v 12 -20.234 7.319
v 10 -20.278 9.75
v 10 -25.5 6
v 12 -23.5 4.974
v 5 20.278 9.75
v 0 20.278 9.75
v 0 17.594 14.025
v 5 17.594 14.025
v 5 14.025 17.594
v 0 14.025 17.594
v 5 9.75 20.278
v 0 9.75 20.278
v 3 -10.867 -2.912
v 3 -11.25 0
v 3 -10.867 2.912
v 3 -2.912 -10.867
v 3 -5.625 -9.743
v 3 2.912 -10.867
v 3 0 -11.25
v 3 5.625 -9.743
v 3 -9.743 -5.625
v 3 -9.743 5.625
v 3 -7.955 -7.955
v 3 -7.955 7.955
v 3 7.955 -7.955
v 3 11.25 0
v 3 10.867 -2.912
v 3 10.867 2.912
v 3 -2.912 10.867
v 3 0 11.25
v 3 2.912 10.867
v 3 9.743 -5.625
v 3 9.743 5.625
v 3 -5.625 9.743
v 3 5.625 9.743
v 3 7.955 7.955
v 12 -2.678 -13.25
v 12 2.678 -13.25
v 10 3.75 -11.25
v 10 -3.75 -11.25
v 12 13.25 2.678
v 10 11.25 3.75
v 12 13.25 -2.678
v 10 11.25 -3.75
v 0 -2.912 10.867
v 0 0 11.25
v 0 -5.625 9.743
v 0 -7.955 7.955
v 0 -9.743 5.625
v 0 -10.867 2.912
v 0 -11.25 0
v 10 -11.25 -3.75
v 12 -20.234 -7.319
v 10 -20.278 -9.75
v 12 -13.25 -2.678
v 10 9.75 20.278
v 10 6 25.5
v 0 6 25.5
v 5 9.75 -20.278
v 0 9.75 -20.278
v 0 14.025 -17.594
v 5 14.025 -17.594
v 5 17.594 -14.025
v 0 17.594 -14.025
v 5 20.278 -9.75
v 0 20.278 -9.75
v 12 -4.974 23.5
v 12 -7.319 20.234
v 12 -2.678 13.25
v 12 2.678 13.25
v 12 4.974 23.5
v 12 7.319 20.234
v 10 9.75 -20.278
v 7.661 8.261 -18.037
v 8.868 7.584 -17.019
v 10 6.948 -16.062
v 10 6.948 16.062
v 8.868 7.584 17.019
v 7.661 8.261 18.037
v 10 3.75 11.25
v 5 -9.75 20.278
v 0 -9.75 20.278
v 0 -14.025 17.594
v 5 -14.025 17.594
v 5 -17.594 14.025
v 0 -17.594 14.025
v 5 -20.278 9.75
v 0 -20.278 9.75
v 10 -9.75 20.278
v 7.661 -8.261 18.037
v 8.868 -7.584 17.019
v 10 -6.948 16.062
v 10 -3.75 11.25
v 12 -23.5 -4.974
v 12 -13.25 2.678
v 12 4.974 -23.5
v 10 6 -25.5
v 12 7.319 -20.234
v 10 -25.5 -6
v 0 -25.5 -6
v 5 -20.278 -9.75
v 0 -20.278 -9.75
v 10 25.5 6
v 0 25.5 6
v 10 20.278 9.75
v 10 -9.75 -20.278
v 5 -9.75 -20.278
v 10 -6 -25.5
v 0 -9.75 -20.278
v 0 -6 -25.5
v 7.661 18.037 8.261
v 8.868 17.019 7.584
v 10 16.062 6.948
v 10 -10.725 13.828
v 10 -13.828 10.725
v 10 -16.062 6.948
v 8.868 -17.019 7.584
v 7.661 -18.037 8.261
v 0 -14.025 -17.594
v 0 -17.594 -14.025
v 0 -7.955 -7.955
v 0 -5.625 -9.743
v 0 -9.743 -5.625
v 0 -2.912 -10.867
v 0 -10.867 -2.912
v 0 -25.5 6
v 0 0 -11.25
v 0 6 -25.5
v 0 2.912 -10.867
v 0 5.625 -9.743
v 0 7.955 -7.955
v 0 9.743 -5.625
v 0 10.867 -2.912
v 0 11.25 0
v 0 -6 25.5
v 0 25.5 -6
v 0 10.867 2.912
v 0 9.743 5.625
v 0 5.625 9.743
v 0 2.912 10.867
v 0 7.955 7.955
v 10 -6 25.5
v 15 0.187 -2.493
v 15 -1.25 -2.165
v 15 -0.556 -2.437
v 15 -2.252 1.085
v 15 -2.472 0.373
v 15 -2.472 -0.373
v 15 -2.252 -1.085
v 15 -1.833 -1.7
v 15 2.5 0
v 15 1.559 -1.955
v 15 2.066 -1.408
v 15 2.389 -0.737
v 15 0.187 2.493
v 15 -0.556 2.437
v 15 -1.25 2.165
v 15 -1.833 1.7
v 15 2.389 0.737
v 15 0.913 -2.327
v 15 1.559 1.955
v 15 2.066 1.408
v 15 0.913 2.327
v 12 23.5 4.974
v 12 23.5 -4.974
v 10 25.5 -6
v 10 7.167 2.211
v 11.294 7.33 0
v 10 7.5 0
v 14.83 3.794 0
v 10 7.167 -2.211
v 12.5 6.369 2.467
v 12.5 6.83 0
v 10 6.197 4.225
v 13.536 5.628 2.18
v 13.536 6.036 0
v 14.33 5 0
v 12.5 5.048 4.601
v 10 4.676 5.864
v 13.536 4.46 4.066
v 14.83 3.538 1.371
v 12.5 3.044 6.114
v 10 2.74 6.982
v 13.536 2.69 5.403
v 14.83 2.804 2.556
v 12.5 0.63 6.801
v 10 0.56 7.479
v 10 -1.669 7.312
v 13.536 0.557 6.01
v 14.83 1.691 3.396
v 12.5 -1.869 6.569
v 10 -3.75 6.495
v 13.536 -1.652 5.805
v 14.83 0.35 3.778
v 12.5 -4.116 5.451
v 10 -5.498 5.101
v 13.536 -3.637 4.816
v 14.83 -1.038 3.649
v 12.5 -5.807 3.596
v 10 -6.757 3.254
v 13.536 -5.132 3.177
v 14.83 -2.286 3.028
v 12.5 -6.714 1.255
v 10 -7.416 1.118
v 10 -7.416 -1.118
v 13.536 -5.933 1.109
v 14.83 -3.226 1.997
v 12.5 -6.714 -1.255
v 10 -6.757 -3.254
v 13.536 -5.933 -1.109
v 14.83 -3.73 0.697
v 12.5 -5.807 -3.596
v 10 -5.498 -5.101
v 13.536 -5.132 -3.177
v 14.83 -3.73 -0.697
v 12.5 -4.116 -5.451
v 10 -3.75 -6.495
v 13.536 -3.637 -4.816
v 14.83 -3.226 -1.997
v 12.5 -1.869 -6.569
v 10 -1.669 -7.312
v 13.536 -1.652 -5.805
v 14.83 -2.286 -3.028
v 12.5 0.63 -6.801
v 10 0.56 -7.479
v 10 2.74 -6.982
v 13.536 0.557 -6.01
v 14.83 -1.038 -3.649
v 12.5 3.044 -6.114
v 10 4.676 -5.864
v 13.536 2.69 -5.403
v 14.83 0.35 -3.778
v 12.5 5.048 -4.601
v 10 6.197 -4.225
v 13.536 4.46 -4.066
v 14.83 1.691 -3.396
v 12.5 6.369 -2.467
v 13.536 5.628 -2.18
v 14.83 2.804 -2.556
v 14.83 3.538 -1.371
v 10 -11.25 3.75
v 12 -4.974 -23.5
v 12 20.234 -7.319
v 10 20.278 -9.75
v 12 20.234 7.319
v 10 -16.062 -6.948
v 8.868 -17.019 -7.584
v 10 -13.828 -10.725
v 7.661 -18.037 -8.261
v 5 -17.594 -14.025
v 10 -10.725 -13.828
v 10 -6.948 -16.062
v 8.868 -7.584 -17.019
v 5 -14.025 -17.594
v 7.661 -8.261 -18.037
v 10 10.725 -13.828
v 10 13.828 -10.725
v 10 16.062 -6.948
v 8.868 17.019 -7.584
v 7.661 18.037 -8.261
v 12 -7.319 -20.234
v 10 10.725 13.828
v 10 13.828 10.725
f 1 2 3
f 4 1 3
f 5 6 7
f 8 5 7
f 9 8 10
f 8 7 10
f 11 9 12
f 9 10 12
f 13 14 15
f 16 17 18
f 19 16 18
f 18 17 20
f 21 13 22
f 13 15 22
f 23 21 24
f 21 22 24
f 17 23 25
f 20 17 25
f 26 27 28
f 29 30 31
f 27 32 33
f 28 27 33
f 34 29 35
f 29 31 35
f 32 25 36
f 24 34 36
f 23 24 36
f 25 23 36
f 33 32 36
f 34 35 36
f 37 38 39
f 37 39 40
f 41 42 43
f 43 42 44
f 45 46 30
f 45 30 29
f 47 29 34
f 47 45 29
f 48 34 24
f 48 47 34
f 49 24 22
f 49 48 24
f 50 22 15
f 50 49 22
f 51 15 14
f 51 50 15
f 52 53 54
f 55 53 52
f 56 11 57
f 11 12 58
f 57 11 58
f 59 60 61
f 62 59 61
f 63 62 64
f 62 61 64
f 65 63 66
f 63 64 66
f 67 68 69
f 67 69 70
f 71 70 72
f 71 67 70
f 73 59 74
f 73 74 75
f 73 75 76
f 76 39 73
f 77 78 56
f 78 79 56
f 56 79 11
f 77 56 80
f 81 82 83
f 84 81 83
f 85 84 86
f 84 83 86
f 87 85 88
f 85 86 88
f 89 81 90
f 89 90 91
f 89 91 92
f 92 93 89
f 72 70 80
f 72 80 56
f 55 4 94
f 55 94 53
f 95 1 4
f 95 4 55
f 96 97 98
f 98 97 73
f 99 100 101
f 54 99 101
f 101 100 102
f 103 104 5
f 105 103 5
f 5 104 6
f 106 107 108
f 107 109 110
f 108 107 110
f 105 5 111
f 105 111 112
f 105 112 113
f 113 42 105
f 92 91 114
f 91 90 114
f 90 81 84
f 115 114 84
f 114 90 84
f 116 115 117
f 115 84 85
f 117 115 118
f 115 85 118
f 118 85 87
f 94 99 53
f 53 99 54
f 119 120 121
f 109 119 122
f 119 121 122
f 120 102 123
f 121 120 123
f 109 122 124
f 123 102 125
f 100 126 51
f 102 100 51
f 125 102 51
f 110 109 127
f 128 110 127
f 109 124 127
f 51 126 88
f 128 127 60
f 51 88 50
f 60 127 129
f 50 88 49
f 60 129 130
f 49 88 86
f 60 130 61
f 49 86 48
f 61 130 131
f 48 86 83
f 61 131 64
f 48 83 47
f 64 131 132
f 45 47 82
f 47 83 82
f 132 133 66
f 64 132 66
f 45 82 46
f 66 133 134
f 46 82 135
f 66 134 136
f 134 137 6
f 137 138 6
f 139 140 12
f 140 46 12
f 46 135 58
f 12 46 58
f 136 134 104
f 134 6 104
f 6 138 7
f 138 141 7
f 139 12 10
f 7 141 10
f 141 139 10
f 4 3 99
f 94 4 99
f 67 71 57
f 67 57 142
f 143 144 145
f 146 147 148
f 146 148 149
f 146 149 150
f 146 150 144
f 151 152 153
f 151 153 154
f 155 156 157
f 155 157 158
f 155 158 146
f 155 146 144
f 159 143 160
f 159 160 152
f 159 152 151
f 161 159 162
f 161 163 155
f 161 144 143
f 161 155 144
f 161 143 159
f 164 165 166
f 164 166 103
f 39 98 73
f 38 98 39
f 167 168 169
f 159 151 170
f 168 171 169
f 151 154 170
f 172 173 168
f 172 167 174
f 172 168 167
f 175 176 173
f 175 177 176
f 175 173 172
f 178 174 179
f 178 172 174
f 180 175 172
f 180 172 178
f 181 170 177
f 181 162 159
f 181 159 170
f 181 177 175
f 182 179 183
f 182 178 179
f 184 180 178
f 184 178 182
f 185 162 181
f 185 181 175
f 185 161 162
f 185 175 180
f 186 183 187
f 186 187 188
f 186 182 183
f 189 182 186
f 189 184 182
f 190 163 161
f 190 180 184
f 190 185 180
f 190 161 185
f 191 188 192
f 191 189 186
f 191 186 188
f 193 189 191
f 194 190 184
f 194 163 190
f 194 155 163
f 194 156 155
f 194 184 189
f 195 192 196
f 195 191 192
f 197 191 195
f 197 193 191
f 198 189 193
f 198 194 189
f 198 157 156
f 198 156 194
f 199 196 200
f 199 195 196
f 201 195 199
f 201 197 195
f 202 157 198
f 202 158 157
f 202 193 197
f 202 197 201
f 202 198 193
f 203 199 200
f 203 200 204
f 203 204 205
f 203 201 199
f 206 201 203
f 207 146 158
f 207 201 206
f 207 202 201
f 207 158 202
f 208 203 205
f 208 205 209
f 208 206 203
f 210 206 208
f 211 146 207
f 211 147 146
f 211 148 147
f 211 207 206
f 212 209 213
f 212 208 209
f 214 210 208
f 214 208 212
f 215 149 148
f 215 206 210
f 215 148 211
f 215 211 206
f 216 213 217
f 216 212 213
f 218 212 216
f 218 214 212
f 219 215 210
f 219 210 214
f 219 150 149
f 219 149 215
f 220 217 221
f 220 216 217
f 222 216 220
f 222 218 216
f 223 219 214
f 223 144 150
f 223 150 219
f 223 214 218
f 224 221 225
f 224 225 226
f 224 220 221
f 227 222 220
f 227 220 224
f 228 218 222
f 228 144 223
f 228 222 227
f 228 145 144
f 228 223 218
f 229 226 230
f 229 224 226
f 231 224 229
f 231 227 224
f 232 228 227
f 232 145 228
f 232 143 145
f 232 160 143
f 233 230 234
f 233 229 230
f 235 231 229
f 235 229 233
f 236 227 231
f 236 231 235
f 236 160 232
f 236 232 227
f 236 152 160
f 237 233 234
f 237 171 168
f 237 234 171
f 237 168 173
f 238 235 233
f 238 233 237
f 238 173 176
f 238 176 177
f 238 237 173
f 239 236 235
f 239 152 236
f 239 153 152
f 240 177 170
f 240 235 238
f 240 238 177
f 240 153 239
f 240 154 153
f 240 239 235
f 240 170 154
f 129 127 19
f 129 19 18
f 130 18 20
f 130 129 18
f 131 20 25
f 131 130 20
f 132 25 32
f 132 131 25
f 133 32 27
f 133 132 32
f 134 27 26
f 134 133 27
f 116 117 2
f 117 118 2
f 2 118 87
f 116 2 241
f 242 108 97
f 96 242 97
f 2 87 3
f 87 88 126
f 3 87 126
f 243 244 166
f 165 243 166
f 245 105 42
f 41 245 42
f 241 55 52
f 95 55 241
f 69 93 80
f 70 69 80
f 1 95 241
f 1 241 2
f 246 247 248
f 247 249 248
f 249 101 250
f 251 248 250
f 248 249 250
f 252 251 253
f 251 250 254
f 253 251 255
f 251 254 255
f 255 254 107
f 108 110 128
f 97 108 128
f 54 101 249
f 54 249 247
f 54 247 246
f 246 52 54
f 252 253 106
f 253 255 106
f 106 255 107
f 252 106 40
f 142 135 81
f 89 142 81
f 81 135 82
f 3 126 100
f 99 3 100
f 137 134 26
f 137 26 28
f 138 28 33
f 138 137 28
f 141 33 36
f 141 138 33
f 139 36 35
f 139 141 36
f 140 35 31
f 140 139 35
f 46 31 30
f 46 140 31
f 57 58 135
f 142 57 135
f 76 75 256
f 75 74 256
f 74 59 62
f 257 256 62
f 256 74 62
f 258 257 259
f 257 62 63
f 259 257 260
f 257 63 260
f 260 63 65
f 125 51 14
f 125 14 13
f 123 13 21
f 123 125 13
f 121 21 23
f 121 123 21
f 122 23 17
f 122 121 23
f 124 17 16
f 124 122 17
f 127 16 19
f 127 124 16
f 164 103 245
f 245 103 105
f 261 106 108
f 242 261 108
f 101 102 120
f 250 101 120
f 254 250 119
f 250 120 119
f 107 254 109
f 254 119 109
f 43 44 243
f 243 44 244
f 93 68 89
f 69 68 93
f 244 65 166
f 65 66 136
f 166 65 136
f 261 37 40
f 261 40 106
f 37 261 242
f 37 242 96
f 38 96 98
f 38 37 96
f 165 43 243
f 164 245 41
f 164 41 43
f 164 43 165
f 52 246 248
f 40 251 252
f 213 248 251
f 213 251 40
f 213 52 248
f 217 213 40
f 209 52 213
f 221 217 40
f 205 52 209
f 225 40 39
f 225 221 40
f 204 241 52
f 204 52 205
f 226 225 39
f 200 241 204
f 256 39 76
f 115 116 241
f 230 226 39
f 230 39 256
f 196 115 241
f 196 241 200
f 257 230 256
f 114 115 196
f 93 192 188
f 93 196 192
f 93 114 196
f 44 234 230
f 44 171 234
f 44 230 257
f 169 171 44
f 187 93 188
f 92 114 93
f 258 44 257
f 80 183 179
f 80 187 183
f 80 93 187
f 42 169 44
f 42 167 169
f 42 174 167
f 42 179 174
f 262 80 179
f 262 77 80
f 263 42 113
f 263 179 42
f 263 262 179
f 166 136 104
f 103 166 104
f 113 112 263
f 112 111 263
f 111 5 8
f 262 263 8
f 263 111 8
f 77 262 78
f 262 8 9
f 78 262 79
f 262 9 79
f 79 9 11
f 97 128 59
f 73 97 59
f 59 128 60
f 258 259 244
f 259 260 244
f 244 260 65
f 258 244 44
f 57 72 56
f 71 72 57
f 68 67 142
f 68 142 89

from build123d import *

# Parameters (mm, degrees)
F1_DEPTH = 10
F2_DEPTH = 12
F3_SIZE  = 5
F4_SIZE  = 1.99999
F5_R     = 7.5
F6_DEPTH = 5
F7_R     = 4.99999
F9_DEPTH = 3


# Not quite as in the source:
# - a fillet or chamfer is up to 0.001 mm smaller than in the source, because OpenCascade refuses the exact size
# - a feature names something its author has since deleted; it is built from what else it names


with BuildPart() as f1:
    # F0 (on Right) → F1 (new body)
    with BuildSketch(Plane.YZ):
        with BuildLine():
            Line((11.25, 3.75), (20.2777587519, 9.75))
            ThreePointArc((20.2777587519, 9.75), (15.9099025767, 15.9099025767), (9.75, 20.2777587519))
            Line((9.75, 20.2777587519), (3.75, 11.25))
            Line((3.75, 11.25), (0, 11.25))
            Line((0, 11.25), (-3.75, 11.25))
            Line((-3.75, 11.25), (-9.75, 20.2777587519))
            ThreePointArc((-9.75, 20.2777587519), (-15.9099025767, 15.9099025767), (-20.2777587519, 9.75))
            Line((-20.2777587519, 9.75), (-11.25, 3.75))
            Line((-11.25, 3.75), (-11.25, 0))
            Line((-11.25, 0), (-11.25, -3.75))
            Line((-11.25, -3.75), (-20.2777587519, -9.75))
            ThreePointArc((-20.2777587519, -9.75), (-15.9099025767, -15.9099025767), (-9.75, -20.2777587519))
            Line((-9.75, -20.2777587519), (-3.75, -11.25))
            Line((-3.75, -11.25), (0, -11.25))
            Line((0, -11.25), (3.75, -11.25))
            Line((3.75, -11.25), (9.75, -20.2777587519))
            ThreePointArc((9.75, -20.2777587519), (15.9099025767, -15.9099025767), (20.2777587519, -9.75))
            Line((20.2777587519, -9.75), (11.25, -3.75))
            Line((11.25, -3.75), (11.25, 0))
            Line((11.25, 0), (11.25, 3.75))
        make_face()
    extrude(amount=F1_DEPTH)

    # F0 (on Right) → F2 (join)
    with BuildSketch(Plane.YZ):
        with BuildLine():
            Line((3.75, 11.25), (9.75, 20.2777587519))
            ThreePointArc((9.75, 20.2777587519), (0, 22.5), (-9.75, 20.2777587519))
            Line((-9.75, 20.2777587519), (-3.75, 11.25))
            Line((-3.75, 11.25), (0, 11.25))
            Line((0, 11.25), (3.75, 11.25))
        make_face()
        with BuildLine():
            ThreePointArc((-9.75, 20.2777587519), (0, 22.5), (9.75, 20.2777587519))
            Line((9.75, 20.2777587519), (6, 25.5))
            Line((6, 25.5), (0, 25.5))
            Line((0, 25.5), (-6, 25.5))
            Line((-6, 25.5), (-9.75, 20.2777587519))
        make_face()
        with BuildLine():
            Line((-11.25, 3.75), (-20.2777587519, 9.75))
            ThreePointArc((-20.2777587519, 9.75), (-22.5, 0), (-20.2777587519, -9.75))
            Line((-20.2777587519, -9.75), (-11.25, -3.75))
            Line((-11.25, -3.75), (-11.25, 0))
            Line((-11.25, 0), (-11.25, 3.75))
        make_face()
        with BuildLine():
            ThreePointArc((-20.2777587519, -9.75), (-22.5, 0), (-20.2777587519, 9.75))
            Line((-20.2777587519, 9.75), (-25.5, 6))
            Line((-25.5, 6), (-25.5, 0))
            Line((-25.5, 0), (-25.5, -6))
            Line((-25.5, -6), (-20.2777587519, -9.75))
        make_face()
        with BuildLine():
            ThreePointArc((-9.75, -20.2777587519), (0, -22.5), (9.75, -20.2777587519))
            Line((9.75, -20.2777587519), (3.75, -11.25))
            Line((3.75, -11.25), (0, -11.25))
            Line((0, -11.25), (-3.75, -11.25))
            Line((-3.75, -11.25), (-9.75, -20.2777587519))
        make_face()
        with BuildLine():
            Line((6, -25.5), (9.75, -20.2777587519))
            ThreePointArc((9.75, -20.2777587519), (0, -22.5), (-9.75, -20.2777587519))
            Line((-9.75, -20.2777587519), (-6, -25.5))
            Line((-6, -25.5), (0, -25.5))
            Line((0, -25.5), (6, -25.5))
        make_face()
        with BuildLine():
            ThreePointArc((20.2777587519, -9.75), (21.93740609, -5.0000214041), (22.5, 0))
            ThreePointArc((22.5, 0), (21.93740609, 5.0000214041), (20.2777587519, 9.75))
            Line((20.2777587519, 9.75), (11.25, 3.75))
            Line((11.25, 3.75), (11.25, 0))
            Line((11.25, 0), (11.25, -3.75))
            Line((11.25, -3.75), (20.2777587519, -9.75))
        make_face()
        with BuildLine():
            ThreePointArc((20.2777587519, 9.75), (21.93740609, 5.0000214041), (22.5, 0))
            ThreePointArc((22.5, 0), (21.93740609, -5.0000214041), (20.2777587519, -9.75))
            Line((20.2777587519, -9.75), (25.5, -6))
            Line((25.5, -6), (25.5, 0))
            Line((25.5, 0), (25.5, 6))
            Line((25.5, 6), (20.2777587519, 9.75))
        make_face()
    extrude(amount=F2_DEPTH)

    # F3
    f3_edges = [f1.edges().sort_by_distance(p)[0] for p in [
        (10, 15.909903, 15.909903),
        (10, -15.909903, 15.909903),
        (10, -15.909903, -15.909903),
        (10, 15.909903, -15.909903),
    ]]
    chamfer(f3_edges, length=F3_SIZE)

    # F4 (size 2 in the source; OpenCascade refuses exactly that, so slightly less here)
    f4_edges = [f1.edges().sort_by_distance(p)[0] for p in [
        (12, 0, 25.5),
        (12, -7.875, 22.888879),
        (12, 7.875, 22.888879),
        (12, -6.75, 15.763879),
        (12, 6.75, 15.763879),
        (12, 0, 11.25),
        (12, -15.763879, 6.75),
        (12, -22.888879, 7.875),
        (12, -25.5, 0),
        (12, -22.888879, -7.875),
        (12, -15.763879, -6.75),
        (12, -11.25, 0),
        (12, 0, -11.25),
        (12, -6.75, -15.763879),
        (12, -7.875, -22.888879),
        (12, 6.75, -15.763879),
        (12, 0, -25.5),
        (12, 7.875, -22.888879),
        (12, 15.763879, -6.75),
        (12, 11.25, 0),
        (12, 15.763879, 6.75),
        (12, 22.888879, 7.875),
        (12, 25.5, 0),
        (12, 22.888879, -7.875),
    ]]
    chamfer(f4_edges, length=F4_SIZE)

    # F5 (on face) → F6 (join)
    with BuildSketch(Plane.YZ.offset(10)):
        Circle(F5_R)
    extrude(amount=F6_DEPTH)

    # F7 (radius 5 in the source; OpenCascade refuses exactly that, so slightly less here)
    f7_edges = [f1.edges().sort_by_distance(p)[0] for p in [
        (15, -7.5, 0),
    ]]
    fillet(f7_edges, radius=F7_R)

    # F8 (on face) → F9 (cut)
    with BuildSketch(Plane.YZ):
        with BuildLine():
            ThreePointArc((0, -11.25), (7.9549512883, -7.9549512883), (11.25, 0))
            ThreePointArc((11.25, 0), (7.9549512883, 7.9549512883), (0, 11.25))
            ThreePointArc((0, 11.25), (-7.9549512883, 7.9549512883), (-11.25, 0))
            ThreePointArc((-11.25, 0), (-7.9549512883, -7.9549512883), (0, -11.25))
        make_face()
    extrude(amount=F9_DEPTH, mode=Mode.SUBTRACT)


solid = f1.part
